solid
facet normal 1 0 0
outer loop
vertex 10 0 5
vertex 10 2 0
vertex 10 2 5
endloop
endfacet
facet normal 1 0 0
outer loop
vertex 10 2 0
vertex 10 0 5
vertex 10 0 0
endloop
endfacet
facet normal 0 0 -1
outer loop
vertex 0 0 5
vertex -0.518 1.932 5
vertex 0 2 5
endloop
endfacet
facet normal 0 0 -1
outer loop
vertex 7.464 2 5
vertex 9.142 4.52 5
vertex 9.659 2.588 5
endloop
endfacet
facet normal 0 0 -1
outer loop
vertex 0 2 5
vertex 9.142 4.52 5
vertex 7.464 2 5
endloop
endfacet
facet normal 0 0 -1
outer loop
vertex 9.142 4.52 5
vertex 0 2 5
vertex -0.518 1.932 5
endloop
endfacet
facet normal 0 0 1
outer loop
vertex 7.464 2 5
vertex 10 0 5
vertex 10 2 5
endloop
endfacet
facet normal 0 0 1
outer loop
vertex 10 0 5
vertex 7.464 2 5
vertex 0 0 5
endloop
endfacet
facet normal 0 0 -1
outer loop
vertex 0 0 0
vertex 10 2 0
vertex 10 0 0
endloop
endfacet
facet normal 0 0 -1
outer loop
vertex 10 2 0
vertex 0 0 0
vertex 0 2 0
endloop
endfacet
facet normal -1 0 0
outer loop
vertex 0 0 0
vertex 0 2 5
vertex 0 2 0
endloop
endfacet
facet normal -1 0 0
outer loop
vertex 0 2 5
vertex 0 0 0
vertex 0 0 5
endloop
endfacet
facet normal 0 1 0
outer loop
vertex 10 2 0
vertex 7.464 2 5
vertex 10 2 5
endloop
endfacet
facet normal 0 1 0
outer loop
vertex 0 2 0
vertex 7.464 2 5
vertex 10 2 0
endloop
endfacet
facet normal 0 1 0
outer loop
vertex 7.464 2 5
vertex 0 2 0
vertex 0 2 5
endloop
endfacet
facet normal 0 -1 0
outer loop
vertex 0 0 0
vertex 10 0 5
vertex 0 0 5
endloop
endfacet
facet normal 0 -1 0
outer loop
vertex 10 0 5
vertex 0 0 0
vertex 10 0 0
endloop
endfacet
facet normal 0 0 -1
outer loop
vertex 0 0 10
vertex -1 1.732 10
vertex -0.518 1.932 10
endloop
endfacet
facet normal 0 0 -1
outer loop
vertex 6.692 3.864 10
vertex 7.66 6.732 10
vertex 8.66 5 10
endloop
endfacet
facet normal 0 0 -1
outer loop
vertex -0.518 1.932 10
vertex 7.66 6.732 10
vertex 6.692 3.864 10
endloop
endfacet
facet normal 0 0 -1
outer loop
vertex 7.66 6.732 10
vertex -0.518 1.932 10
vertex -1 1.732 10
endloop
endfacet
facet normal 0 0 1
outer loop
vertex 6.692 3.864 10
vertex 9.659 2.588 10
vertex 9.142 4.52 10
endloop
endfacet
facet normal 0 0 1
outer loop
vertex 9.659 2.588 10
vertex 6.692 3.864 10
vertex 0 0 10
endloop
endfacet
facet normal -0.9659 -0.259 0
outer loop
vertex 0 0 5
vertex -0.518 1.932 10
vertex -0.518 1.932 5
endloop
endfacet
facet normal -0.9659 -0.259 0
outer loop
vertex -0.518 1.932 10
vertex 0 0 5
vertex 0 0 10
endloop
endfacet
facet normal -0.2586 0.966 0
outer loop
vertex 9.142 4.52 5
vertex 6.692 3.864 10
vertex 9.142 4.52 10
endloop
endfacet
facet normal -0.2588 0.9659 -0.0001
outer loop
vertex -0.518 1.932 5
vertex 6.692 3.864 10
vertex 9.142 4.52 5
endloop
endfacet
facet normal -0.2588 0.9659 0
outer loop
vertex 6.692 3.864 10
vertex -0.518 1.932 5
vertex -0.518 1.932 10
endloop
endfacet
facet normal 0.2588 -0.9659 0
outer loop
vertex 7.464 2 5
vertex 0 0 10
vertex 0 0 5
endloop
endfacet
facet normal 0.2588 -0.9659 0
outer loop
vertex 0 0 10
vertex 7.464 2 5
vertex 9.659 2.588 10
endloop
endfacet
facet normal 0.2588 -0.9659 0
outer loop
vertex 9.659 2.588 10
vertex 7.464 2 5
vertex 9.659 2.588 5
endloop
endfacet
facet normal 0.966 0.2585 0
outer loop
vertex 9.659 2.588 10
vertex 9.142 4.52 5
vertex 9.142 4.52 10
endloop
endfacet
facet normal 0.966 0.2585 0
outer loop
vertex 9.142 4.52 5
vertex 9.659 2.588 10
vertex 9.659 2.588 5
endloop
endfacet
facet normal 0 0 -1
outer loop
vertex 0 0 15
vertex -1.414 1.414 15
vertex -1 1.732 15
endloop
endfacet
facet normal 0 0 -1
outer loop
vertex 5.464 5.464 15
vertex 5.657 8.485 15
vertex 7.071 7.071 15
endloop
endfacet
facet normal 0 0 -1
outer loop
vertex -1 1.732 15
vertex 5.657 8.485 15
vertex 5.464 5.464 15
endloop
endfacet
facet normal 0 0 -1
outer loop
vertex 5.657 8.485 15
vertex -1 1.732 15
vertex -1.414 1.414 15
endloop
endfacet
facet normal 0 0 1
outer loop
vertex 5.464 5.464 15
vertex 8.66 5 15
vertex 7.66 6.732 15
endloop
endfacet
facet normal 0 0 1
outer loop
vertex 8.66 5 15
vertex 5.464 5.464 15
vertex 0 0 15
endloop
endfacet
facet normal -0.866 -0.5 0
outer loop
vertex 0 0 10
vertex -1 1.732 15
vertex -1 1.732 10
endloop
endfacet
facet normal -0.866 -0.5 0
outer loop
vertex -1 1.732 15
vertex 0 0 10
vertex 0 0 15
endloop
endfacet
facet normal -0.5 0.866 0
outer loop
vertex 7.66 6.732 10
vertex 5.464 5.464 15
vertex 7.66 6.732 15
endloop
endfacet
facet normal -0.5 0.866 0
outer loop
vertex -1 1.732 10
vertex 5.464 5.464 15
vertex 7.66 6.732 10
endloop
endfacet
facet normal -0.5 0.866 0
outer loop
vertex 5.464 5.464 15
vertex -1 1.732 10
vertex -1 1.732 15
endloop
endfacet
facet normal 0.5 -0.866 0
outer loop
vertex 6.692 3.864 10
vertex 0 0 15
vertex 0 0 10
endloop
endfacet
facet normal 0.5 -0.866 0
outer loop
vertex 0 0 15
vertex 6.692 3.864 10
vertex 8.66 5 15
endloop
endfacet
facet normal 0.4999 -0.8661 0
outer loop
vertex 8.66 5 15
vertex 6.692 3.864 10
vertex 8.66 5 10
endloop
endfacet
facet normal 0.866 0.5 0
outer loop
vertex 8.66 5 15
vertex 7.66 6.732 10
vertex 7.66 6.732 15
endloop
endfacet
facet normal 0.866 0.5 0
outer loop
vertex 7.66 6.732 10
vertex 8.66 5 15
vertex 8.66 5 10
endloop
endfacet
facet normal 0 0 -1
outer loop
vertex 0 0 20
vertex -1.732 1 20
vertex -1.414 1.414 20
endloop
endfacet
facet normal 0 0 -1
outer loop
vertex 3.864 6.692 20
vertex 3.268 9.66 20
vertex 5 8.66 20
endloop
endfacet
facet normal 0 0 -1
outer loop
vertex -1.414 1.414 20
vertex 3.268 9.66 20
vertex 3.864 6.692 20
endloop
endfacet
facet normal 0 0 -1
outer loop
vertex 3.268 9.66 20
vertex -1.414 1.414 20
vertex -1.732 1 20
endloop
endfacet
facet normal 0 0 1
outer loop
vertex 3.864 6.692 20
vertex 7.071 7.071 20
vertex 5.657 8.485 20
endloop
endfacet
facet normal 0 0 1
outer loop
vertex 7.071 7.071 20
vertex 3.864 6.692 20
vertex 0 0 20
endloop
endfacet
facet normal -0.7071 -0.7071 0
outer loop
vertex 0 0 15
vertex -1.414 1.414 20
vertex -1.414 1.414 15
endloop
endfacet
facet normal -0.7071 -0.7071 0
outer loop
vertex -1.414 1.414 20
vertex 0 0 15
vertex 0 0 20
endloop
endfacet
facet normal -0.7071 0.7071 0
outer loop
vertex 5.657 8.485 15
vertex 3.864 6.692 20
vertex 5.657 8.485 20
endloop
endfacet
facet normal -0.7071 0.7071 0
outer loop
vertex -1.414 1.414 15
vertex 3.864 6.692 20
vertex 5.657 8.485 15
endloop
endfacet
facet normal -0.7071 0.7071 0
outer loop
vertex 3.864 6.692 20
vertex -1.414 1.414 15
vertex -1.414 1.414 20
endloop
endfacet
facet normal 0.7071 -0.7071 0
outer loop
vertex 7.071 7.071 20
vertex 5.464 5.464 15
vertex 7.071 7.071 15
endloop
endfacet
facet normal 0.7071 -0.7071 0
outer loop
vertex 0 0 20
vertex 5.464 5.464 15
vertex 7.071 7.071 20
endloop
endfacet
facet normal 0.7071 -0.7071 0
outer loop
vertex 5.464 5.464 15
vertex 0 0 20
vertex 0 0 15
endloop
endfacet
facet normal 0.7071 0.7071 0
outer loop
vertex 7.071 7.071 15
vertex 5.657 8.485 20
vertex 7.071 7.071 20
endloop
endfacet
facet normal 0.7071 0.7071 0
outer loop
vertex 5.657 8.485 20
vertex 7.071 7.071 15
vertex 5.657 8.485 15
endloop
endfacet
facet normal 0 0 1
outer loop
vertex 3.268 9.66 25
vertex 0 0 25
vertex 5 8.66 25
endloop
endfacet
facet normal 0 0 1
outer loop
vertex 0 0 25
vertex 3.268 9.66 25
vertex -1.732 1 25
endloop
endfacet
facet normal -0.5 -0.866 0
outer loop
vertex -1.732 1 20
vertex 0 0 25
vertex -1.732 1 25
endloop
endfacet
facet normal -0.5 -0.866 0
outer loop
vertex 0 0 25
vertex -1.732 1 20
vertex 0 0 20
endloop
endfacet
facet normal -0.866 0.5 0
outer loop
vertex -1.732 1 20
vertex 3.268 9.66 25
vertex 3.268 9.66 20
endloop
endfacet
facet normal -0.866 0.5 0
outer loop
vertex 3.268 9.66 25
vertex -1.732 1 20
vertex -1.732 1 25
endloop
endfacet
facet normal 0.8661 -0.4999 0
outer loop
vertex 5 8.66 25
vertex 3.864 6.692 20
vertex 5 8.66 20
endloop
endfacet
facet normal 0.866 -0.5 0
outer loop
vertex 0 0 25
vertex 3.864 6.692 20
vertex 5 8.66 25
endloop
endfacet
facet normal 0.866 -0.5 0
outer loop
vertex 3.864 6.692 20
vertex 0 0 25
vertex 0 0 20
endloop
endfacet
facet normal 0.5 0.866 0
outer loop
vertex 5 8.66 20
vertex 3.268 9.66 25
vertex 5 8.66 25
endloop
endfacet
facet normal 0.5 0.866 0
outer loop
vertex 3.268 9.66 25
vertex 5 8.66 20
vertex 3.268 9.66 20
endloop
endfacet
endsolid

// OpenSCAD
/*linear_extrude(20,center=false,twist=45, slices=100,scale=0.3, $fn=5) 
translate([0,0,0]) 
square([5,20]);
*/

k=5;

    for(i = [0:4]) {
        translate([0,0,k*i]) rotate([0,0,i*15]) cube([10,2,k]);
    }
